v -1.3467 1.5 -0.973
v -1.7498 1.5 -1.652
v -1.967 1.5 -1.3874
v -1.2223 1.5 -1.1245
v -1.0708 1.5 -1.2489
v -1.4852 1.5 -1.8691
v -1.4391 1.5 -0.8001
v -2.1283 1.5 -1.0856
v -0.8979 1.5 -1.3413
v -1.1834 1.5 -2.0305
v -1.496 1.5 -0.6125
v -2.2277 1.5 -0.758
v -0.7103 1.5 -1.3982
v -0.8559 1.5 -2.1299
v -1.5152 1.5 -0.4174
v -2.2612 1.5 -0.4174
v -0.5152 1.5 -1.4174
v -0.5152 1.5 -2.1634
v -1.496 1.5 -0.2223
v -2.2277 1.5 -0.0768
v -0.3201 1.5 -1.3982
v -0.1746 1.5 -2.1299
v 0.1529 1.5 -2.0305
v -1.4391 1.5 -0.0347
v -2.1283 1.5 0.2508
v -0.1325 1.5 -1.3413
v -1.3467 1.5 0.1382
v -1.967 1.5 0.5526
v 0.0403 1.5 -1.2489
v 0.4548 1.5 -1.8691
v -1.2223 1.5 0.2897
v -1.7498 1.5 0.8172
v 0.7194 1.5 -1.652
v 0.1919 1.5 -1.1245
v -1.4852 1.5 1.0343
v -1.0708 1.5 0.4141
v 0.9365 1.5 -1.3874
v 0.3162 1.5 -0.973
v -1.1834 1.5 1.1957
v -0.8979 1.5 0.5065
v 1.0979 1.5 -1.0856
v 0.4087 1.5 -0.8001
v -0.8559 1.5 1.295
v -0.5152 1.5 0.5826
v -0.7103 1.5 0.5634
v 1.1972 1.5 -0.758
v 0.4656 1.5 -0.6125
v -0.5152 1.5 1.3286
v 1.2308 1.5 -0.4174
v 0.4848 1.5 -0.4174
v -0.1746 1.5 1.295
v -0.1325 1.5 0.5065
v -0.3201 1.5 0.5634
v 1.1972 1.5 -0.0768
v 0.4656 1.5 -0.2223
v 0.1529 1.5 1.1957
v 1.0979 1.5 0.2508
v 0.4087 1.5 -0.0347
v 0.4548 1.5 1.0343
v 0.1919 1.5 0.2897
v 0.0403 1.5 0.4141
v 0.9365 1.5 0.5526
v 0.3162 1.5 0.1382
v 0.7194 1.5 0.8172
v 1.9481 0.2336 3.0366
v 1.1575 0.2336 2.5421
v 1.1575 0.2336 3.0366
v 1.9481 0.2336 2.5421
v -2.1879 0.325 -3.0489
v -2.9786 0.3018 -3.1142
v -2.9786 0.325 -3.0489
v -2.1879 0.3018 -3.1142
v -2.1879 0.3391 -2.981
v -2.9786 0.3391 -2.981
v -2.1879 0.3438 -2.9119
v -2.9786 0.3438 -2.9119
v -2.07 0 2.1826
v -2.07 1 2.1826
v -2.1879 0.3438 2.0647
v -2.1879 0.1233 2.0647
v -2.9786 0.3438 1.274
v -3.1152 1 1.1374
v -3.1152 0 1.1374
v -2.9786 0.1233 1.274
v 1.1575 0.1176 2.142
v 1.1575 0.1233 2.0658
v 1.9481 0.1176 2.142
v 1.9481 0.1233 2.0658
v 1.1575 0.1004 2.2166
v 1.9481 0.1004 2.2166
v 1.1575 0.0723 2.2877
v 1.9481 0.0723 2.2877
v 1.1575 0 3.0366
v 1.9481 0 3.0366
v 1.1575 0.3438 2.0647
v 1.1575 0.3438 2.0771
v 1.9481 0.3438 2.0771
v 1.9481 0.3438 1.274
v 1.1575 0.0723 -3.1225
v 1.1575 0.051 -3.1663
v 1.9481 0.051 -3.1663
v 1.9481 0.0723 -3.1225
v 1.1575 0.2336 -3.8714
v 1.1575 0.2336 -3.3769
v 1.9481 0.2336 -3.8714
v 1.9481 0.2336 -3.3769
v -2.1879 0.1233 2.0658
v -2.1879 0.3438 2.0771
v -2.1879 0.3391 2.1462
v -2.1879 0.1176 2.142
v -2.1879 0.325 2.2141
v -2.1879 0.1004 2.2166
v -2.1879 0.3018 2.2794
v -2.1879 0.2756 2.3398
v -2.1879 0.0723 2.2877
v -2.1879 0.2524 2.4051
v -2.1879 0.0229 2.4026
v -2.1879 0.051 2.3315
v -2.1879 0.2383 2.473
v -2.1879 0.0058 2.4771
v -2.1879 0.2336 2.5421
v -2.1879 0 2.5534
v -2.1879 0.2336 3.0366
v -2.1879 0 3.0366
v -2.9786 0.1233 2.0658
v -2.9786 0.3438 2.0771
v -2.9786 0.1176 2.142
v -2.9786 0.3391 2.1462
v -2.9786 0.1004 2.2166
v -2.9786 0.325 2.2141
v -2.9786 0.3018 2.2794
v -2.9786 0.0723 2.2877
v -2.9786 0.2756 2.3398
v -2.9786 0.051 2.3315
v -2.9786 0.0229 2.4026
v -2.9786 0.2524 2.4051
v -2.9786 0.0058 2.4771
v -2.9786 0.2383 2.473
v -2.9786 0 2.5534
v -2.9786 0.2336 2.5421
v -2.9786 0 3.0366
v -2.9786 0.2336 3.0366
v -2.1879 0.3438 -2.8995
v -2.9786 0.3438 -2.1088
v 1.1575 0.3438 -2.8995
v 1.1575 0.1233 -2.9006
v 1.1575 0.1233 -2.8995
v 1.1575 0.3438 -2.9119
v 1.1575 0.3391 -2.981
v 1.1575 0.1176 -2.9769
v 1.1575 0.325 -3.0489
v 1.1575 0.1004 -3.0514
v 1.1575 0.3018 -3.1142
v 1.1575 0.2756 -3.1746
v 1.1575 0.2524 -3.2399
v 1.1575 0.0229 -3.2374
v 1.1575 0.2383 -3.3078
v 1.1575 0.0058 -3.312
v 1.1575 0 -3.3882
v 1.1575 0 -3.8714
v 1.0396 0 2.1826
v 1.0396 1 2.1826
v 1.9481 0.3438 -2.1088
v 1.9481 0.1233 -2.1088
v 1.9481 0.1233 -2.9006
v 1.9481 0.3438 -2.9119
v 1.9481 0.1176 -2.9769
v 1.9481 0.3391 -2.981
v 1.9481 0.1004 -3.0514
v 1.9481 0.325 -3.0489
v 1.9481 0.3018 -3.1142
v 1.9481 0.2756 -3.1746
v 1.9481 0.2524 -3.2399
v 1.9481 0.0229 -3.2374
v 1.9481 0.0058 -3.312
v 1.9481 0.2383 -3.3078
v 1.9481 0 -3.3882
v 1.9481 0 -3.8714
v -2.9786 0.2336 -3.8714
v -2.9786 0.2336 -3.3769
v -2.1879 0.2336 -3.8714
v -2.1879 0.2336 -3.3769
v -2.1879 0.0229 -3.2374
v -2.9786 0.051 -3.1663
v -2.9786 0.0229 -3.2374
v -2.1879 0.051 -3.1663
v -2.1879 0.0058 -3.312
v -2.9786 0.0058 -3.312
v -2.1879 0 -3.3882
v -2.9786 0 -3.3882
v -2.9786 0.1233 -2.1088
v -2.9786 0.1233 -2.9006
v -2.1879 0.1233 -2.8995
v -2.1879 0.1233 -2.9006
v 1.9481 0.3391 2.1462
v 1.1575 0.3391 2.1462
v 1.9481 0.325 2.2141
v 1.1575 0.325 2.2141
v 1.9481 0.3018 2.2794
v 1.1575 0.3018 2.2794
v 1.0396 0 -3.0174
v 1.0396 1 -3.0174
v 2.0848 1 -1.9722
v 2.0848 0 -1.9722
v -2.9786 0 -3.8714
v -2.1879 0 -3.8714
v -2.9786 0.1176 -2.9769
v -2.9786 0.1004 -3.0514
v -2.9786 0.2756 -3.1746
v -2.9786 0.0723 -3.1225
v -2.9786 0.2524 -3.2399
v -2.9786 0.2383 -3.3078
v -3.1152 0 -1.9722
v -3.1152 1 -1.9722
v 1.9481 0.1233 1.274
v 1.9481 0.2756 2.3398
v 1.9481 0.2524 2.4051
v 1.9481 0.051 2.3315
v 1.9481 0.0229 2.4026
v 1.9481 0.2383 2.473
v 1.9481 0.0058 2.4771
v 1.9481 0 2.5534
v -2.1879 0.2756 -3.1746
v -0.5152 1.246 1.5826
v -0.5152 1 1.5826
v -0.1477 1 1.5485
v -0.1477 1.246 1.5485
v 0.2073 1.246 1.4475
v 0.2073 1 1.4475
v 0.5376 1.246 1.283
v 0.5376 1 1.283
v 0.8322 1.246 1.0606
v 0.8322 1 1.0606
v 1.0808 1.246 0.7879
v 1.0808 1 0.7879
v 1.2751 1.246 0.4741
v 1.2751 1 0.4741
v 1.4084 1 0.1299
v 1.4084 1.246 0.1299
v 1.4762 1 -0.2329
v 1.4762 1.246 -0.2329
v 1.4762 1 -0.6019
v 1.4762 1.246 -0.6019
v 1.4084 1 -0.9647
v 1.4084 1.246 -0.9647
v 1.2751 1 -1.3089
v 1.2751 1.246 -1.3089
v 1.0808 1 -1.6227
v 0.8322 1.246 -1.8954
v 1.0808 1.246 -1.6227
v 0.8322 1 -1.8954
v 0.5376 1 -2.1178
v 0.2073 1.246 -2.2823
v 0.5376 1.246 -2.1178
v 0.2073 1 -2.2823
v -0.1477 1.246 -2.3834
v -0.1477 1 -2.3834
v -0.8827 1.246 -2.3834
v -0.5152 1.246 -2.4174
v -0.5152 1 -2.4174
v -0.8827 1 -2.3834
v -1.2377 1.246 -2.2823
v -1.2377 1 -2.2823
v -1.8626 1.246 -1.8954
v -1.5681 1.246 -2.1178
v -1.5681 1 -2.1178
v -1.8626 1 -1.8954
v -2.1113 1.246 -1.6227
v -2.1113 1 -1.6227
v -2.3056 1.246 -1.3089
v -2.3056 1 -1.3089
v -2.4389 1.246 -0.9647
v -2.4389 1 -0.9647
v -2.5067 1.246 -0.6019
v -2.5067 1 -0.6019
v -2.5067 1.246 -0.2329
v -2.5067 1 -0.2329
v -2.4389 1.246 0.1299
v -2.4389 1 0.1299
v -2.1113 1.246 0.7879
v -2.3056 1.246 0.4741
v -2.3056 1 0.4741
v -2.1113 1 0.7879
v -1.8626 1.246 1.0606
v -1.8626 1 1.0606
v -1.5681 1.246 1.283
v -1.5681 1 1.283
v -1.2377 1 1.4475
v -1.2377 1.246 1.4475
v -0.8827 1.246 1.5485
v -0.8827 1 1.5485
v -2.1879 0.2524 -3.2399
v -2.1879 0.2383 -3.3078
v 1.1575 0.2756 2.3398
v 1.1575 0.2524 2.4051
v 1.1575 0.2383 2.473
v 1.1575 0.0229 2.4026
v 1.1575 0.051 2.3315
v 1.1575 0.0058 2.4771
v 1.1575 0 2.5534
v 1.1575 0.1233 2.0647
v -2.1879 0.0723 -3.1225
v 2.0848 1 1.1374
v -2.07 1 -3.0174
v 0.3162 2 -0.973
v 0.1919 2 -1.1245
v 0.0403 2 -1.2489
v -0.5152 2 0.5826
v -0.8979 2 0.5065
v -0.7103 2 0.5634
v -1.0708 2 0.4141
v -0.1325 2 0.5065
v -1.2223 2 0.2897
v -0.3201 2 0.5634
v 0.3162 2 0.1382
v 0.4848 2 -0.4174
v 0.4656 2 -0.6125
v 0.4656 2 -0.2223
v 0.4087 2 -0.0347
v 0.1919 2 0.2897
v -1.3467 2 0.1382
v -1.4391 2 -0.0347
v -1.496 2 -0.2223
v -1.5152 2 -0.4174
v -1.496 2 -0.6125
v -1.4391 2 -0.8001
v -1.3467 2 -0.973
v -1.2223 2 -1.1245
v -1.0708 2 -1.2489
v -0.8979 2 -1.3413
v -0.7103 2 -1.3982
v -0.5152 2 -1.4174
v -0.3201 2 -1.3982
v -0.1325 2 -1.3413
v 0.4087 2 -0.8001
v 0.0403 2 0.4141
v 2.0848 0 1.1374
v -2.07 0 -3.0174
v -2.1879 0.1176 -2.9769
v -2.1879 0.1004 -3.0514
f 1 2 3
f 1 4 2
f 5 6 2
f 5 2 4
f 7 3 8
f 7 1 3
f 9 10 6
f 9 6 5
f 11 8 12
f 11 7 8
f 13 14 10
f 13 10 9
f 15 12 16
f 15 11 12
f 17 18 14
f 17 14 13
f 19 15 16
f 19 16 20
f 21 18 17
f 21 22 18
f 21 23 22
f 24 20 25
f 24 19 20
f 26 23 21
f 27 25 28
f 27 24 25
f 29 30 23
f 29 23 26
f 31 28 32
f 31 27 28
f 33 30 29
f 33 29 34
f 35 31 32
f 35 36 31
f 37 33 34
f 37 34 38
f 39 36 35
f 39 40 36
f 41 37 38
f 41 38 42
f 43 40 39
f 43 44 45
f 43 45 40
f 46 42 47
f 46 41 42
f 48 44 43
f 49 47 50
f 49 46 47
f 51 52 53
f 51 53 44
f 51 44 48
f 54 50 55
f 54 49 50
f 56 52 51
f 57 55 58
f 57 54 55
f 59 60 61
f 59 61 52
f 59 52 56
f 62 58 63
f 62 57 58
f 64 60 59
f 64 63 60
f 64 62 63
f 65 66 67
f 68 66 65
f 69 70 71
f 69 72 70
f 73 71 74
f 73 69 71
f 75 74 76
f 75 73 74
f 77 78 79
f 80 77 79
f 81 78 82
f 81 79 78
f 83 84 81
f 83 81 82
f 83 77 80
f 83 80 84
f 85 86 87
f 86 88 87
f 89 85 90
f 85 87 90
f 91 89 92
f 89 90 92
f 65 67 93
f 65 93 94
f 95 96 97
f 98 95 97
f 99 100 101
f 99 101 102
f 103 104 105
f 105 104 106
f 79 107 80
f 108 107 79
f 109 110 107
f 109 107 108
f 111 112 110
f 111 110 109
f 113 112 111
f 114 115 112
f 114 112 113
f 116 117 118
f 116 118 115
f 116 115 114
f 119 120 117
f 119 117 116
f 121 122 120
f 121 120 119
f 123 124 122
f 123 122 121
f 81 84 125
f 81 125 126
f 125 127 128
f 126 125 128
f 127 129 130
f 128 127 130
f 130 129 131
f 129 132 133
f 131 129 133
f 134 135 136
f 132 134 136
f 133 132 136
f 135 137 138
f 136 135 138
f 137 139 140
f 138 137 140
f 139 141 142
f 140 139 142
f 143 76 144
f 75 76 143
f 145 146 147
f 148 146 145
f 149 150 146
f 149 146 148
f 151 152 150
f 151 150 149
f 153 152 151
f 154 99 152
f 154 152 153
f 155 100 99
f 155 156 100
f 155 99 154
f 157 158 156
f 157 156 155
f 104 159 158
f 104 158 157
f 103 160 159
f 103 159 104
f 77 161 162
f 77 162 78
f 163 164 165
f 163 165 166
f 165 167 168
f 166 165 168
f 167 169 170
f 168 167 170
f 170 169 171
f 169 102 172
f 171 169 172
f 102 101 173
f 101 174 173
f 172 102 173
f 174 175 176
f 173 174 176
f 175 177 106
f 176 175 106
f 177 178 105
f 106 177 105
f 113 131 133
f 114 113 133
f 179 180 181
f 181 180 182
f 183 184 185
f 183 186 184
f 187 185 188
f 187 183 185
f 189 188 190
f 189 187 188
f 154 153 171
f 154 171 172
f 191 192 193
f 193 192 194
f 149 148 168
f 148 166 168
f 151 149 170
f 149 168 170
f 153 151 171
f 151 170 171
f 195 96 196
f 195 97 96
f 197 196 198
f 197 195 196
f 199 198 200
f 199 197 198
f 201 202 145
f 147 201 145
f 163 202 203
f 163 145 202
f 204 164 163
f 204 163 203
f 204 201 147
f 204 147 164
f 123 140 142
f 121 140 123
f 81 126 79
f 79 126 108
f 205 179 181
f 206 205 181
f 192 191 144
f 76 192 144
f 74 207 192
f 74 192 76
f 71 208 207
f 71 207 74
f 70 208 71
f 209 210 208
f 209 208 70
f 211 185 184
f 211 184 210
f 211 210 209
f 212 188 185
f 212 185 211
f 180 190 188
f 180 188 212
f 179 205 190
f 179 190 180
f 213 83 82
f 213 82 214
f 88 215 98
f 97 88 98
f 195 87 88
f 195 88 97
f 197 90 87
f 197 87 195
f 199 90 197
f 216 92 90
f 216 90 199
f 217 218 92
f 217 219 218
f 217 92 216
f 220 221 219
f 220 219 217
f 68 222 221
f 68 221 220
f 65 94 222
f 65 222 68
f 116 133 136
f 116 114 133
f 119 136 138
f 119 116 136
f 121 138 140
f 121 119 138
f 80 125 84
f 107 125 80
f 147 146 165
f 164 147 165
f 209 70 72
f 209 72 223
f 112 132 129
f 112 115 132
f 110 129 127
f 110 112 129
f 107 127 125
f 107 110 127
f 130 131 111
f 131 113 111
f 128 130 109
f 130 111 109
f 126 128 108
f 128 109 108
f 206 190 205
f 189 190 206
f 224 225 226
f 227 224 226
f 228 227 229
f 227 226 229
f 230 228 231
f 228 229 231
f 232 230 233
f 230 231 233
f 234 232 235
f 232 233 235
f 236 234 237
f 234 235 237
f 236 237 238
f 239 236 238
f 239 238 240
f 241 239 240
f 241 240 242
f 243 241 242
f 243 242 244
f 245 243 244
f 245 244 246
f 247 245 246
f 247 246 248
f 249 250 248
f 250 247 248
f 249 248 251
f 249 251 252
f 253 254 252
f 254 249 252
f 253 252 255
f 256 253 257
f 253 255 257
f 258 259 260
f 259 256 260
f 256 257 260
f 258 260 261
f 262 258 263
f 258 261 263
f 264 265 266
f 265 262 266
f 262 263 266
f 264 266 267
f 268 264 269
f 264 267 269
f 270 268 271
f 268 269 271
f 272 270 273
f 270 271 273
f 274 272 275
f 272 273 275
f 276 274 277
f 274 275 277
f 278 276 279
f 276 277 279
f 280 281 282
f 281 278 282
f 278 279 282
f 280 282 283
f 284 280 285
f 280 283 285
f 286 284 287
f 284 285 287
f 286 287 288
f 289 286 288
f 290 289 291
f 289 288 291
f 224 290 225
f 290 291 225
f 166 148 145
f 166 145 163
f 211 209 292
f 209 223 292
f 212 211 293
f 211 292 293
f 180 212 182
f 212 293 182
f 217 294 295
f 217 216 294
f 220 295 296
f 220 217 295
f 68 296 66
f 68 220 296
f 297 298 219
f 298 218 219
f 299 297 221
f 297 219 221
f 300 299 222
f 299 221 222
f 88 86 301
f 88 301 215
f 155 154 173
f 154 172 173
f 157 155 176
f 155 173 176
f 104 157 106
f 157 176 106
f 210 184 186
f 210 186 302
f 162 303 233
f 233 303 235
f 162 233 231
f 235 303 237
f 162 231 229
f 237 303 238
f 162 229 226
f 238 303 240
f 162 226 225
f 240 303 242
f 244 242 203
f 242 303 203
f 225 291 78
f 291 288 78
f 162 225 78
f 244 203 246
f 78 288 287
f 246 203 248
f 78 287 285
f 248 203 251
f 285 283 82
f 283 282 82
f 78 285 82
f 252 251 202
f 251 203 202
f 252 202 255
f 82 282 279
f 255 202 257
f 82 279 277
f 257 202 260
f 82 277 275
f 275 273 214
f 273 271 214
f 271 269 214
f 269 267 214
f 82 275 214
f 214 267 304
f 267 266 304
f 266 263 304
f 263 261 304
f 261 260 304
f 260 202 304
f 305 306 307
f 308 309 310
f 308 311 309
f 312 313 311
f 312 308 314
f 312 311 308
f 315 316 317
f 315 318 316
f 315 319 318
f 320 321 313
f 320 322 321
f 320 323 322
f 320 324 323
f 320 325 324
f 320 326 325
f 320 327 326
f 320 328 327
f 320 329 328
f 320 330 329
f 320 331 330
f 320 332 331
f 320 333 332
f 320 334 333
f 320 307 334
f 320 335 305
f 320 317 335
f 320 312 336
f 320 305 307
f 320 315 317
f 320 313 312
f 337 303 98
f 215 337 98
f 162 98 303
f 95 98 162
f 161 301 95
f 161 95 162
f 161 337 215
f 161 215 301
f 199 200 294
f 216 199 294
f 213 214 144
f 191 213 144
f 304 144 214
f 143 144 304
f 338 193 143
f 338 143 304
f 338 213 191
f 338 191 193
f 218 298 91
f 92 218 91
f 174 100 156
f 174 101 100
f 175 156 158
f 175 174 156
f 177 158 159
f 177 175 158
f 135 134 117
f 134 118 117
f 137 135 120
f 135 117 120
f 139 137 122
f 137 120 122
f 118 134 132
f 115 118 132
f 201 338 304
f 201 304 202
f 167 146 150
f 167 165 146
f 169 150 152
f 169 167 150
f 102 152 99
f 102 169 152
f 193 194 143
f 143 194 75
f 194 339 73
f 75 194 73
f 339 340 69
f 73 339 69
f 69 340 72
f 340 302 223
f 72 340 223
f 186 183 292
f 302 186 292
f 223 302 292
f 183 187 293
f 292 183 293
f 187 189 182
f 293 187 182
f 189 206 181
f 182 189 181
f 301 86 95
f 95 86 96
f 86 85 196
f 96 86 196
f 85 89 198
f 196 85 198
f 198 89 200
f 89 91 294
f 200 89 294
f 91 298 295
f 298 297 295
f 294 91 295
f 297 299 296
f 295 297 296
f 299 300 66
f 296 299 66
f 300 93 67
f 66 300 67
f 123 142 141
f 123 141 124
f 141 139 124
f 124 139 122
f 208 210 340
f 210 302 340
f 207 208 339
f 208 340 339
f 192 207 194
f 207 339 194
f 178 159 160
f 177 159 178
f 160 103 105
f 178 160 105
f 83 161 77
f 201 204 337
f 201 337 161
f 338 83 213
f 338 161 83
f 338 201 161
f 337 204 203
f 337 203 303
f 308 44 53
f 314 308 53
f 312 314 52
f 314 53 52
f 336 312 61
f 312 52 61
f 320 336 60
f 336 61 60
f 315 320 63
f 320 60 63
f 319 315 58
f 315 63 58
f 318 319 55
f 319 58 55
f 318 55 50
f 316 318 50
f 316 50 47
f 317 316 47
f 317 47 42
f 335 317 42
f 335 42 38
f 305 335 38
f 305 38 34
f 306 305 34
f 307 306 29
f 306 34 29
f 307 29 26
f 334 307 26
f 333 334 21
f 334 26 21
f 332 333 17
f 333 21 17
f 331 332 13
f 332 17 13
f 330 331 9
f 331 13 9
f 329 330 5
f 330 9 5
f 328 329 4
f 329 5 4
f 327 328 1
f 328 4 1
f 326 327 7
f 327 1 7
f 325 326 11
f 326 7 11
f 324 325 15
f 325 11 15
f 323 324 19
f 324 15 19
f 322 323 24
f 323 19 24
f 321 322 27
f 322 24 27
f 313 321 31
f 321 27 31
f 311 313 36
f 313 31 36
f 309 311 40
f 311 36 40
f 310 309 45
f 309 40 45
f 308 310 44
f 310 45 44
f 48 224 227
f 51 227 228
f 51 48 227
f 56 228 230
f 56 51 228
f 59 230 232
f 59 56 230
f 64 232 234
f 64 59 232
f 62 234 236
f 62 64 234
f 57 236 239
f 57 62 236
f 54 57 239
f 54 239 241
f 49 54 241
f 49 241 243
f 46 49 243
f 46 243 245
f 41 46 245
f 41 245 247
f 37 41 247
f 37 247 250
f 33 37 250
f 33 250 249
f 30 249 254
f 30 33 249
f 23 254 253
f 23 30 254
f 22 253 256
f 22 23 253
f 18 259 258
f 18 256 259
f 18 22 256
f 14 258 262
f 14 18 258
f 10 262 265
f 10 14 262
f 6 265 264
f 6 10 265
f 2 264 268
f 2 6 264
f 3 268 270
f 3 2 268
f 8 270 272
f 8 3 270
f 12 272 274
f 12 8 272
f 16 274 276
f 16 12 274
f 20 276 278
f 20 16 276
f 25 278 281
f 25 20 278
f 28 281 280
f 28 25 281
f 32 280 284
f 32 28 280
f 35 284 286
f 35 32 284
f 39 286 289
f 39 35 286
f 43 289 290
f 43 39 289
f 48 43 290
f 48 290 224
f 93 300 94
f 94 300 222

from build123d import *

# Parameters (mm, degrees)
BOSS_EXTRUDE1_DEPTH   = 1
SKETCH4_R             = 2
BOSS_EXTRUDE3_DEPTH   = 0.5
SKETCH2_R             = 1
BOSS_EXTRUDE2_DEPTH   = 0.5
CHAMFER1_SIZE         = 0.254
SKETCH5_W             = 0.790640215
SKETCH5_H             = 0.2205187
BOSS_EXTRUDE4_DEPTH   = 1.644
BOSS_EXTRUDE4_2_DEPTH = 1.644
SKETCH7_W             = 0.790640215
SKETCH7_H             = 0.233563057
BOSS_EXTRUDE5_DEPTH   = 0.6
BOSS_EXTRUDE5_2_DEPTH = 0.6
LOFT1_START           = 1.157491545
LOFT1_DEPTH           = 0.790640215
LOFT2_START           = -2.978578696
LOFT2_DEPTH           = 0.790640215
FILLET1_R             = 0.508


# Read off the part's stored shape, not the designer's step: Loft1, Loft2, Mirror1
with BuildPart() as part:
    # Sketch1 → Boss-Extrude1 (new body)
    with BuildSketch(Plane(origin=(0, 0, 0), x_dir=(1, 0, 0), z_dir=(0, 1, 0))):
        Polygon((-3.115223468, 1.972186251), (-2.070005732, 3.017403987), (1.039558796, 3.017403987), (2.084776532, 1.972186251), (2.084776532, -1.137378277), (1.039558796, -2.182596013), (-2.070005732, -2.182596013), (-3.115223468, -1.137378277), align=None)
    extrude(amount=BOSS_EXTRUDE1_DEPTH)

    # Sketch4 → Boss-Extrude3 (add)
    with BuildSketch(Plane(origin=(0, 1, 0), x_dir=(1, 0, 0), z_dir=(0, 1, 0))):
        with Locations(Location((-0.515223468, 0.417403987, 0), (0, 0, 270))):
            Circle(SKETCH4_R)
    extrude(amount=BOSS_EXTRUDE3_DEPTH)

    # Sketch2 → Boss-Extrude2 (add)
    with BuildSketch(Plane(origin=(0, 1.5, 0), x_dir=(1, 0, 0), z_dir=(0, 1, 0))):
        with Locations(Location((-0.515223468, 0.417403987, 0), (0, 0, 270))):
            Circle(SKETCH2_R)
    extrude(amount=BOSS_EXTRUDE2_DEPTH)

    # Chamfer1
    chamfer1_edges = [part.edges().sort_by_distance(p)[0] for p in [
        (-0.515223468, 1.5, -2.417403987),
    ]]
    chamfer(chamfer1_edges, length=CHAMFER1_SIZE)



with BuildPart() as body_2:
    # Sketch5 → Boss-Extrude4 (new body)
    with BuildSketch(Plane.XY.offset(2.182596013)):
        with Locations((-2.583258589, 0.233563057)):
            Rectangle(SKETCH5_W, SKETCH5_H)
    extrude(amount=-BOSS_EXTRUDE4_DEPTH)



with BuildPart() as body_3:
    # Sketch5 → Boss-Extrude4 2 (new body)
    with BuildSketch(Plane.XY.offset(2.182596013)):
        with Locations((1.552811652, 0.233563057)):
            Rectangle(SKETCH5_W, SKETCH5_H)
    extrude(amount=-BOSS_EXTRUDE4_2_DEPTH)


with BuildPart() as body_4:
    # Sketch7 → Boss-Extrude5 (new body)
    with BuildSketch(Plane.XY.offset(2.436596013)):
        with Locations((-2.583258589, 0.116781529)):
            Rectangle(SKETCH7_W, SKETCH7_H)
    extrude(amount=BOSS_EXTRUDE5_DEPTH)


with BuildPart() as body_5:
    # Sketch7 → Boss-Extrude5 2 (new body)
    with BuildSketch(Plane.XY.offset(2.436596013)):
        with Locations((1.552811652, 0.116781529)):
            Rectangle(SKETCH7_W, SKETCH7_H)
    extrude(amount=BOSS_EXTRUDE5_2_DEPTH)


with BuildPart() as part_1:
    add(part.part)

    add(body_3.part)  # Loft1 merges body 3

    add(body_5.part)  # Loft1 merges body 5
    # Loft1 outline → Loft1 (add)
    with BuildSketch(Plane.YZ.offset(LOFT1_START)):
        Polygon((0.233563057, 2.436596013), (0, 2.436596013), (0.123303707, 2.182596013), (0.343822407, 2.182596013), align=None)
    extrude(amount=LOFT1_DEPTH)


with BuildPart() as body_2_1:
    add(body_2.part)

    add(body_4.part)  # Loft2 merges body 4

    add(part_1.part)  # Loft2 merges part
    # Loft2 outline → Loft2 (add)
    with BuildSketch(Plane.YZ.offset(LOFT2_START)):
        Polygon((0.123303707, 2.182596013), (0.343822407, 2.182596013), (0.233563057, 2.436596013), (0, 2.436596013), align=None)
    extrude(amount=LOFT2_DEPTH)

    # Fillet1
    fillet1_edges = [body_2_1.edges().sort_by_distance(p)[0] for p in [
        (1.552811653, 0.343822407, 2.182596013),
        (-2.583258588, 0.343822407, 2.182596013),
        (-2.583258588, 0, 2.436596013),
        (1.552811653, 0, 2.436596013),
        (-2.583258588, 0.233563057, 2.436596013),
        (1.552811653, 0.233563057, 2.436596013),
        (-2.583258588, 0.123303707, 2.182596013),
        (1.552811653, 0.123303707, 2.182596013),
    ]]
    fillet(fillet1_edges, radius=FILLET1_R)

    # Mirror1: body 2 across plane


with BuildPart() as body_2_2:
    add(body_2_1.part)
    add(body_2_1.part.mirror(Plane.XY.offset(-0.417403987)))


solid = body_2_2.part
